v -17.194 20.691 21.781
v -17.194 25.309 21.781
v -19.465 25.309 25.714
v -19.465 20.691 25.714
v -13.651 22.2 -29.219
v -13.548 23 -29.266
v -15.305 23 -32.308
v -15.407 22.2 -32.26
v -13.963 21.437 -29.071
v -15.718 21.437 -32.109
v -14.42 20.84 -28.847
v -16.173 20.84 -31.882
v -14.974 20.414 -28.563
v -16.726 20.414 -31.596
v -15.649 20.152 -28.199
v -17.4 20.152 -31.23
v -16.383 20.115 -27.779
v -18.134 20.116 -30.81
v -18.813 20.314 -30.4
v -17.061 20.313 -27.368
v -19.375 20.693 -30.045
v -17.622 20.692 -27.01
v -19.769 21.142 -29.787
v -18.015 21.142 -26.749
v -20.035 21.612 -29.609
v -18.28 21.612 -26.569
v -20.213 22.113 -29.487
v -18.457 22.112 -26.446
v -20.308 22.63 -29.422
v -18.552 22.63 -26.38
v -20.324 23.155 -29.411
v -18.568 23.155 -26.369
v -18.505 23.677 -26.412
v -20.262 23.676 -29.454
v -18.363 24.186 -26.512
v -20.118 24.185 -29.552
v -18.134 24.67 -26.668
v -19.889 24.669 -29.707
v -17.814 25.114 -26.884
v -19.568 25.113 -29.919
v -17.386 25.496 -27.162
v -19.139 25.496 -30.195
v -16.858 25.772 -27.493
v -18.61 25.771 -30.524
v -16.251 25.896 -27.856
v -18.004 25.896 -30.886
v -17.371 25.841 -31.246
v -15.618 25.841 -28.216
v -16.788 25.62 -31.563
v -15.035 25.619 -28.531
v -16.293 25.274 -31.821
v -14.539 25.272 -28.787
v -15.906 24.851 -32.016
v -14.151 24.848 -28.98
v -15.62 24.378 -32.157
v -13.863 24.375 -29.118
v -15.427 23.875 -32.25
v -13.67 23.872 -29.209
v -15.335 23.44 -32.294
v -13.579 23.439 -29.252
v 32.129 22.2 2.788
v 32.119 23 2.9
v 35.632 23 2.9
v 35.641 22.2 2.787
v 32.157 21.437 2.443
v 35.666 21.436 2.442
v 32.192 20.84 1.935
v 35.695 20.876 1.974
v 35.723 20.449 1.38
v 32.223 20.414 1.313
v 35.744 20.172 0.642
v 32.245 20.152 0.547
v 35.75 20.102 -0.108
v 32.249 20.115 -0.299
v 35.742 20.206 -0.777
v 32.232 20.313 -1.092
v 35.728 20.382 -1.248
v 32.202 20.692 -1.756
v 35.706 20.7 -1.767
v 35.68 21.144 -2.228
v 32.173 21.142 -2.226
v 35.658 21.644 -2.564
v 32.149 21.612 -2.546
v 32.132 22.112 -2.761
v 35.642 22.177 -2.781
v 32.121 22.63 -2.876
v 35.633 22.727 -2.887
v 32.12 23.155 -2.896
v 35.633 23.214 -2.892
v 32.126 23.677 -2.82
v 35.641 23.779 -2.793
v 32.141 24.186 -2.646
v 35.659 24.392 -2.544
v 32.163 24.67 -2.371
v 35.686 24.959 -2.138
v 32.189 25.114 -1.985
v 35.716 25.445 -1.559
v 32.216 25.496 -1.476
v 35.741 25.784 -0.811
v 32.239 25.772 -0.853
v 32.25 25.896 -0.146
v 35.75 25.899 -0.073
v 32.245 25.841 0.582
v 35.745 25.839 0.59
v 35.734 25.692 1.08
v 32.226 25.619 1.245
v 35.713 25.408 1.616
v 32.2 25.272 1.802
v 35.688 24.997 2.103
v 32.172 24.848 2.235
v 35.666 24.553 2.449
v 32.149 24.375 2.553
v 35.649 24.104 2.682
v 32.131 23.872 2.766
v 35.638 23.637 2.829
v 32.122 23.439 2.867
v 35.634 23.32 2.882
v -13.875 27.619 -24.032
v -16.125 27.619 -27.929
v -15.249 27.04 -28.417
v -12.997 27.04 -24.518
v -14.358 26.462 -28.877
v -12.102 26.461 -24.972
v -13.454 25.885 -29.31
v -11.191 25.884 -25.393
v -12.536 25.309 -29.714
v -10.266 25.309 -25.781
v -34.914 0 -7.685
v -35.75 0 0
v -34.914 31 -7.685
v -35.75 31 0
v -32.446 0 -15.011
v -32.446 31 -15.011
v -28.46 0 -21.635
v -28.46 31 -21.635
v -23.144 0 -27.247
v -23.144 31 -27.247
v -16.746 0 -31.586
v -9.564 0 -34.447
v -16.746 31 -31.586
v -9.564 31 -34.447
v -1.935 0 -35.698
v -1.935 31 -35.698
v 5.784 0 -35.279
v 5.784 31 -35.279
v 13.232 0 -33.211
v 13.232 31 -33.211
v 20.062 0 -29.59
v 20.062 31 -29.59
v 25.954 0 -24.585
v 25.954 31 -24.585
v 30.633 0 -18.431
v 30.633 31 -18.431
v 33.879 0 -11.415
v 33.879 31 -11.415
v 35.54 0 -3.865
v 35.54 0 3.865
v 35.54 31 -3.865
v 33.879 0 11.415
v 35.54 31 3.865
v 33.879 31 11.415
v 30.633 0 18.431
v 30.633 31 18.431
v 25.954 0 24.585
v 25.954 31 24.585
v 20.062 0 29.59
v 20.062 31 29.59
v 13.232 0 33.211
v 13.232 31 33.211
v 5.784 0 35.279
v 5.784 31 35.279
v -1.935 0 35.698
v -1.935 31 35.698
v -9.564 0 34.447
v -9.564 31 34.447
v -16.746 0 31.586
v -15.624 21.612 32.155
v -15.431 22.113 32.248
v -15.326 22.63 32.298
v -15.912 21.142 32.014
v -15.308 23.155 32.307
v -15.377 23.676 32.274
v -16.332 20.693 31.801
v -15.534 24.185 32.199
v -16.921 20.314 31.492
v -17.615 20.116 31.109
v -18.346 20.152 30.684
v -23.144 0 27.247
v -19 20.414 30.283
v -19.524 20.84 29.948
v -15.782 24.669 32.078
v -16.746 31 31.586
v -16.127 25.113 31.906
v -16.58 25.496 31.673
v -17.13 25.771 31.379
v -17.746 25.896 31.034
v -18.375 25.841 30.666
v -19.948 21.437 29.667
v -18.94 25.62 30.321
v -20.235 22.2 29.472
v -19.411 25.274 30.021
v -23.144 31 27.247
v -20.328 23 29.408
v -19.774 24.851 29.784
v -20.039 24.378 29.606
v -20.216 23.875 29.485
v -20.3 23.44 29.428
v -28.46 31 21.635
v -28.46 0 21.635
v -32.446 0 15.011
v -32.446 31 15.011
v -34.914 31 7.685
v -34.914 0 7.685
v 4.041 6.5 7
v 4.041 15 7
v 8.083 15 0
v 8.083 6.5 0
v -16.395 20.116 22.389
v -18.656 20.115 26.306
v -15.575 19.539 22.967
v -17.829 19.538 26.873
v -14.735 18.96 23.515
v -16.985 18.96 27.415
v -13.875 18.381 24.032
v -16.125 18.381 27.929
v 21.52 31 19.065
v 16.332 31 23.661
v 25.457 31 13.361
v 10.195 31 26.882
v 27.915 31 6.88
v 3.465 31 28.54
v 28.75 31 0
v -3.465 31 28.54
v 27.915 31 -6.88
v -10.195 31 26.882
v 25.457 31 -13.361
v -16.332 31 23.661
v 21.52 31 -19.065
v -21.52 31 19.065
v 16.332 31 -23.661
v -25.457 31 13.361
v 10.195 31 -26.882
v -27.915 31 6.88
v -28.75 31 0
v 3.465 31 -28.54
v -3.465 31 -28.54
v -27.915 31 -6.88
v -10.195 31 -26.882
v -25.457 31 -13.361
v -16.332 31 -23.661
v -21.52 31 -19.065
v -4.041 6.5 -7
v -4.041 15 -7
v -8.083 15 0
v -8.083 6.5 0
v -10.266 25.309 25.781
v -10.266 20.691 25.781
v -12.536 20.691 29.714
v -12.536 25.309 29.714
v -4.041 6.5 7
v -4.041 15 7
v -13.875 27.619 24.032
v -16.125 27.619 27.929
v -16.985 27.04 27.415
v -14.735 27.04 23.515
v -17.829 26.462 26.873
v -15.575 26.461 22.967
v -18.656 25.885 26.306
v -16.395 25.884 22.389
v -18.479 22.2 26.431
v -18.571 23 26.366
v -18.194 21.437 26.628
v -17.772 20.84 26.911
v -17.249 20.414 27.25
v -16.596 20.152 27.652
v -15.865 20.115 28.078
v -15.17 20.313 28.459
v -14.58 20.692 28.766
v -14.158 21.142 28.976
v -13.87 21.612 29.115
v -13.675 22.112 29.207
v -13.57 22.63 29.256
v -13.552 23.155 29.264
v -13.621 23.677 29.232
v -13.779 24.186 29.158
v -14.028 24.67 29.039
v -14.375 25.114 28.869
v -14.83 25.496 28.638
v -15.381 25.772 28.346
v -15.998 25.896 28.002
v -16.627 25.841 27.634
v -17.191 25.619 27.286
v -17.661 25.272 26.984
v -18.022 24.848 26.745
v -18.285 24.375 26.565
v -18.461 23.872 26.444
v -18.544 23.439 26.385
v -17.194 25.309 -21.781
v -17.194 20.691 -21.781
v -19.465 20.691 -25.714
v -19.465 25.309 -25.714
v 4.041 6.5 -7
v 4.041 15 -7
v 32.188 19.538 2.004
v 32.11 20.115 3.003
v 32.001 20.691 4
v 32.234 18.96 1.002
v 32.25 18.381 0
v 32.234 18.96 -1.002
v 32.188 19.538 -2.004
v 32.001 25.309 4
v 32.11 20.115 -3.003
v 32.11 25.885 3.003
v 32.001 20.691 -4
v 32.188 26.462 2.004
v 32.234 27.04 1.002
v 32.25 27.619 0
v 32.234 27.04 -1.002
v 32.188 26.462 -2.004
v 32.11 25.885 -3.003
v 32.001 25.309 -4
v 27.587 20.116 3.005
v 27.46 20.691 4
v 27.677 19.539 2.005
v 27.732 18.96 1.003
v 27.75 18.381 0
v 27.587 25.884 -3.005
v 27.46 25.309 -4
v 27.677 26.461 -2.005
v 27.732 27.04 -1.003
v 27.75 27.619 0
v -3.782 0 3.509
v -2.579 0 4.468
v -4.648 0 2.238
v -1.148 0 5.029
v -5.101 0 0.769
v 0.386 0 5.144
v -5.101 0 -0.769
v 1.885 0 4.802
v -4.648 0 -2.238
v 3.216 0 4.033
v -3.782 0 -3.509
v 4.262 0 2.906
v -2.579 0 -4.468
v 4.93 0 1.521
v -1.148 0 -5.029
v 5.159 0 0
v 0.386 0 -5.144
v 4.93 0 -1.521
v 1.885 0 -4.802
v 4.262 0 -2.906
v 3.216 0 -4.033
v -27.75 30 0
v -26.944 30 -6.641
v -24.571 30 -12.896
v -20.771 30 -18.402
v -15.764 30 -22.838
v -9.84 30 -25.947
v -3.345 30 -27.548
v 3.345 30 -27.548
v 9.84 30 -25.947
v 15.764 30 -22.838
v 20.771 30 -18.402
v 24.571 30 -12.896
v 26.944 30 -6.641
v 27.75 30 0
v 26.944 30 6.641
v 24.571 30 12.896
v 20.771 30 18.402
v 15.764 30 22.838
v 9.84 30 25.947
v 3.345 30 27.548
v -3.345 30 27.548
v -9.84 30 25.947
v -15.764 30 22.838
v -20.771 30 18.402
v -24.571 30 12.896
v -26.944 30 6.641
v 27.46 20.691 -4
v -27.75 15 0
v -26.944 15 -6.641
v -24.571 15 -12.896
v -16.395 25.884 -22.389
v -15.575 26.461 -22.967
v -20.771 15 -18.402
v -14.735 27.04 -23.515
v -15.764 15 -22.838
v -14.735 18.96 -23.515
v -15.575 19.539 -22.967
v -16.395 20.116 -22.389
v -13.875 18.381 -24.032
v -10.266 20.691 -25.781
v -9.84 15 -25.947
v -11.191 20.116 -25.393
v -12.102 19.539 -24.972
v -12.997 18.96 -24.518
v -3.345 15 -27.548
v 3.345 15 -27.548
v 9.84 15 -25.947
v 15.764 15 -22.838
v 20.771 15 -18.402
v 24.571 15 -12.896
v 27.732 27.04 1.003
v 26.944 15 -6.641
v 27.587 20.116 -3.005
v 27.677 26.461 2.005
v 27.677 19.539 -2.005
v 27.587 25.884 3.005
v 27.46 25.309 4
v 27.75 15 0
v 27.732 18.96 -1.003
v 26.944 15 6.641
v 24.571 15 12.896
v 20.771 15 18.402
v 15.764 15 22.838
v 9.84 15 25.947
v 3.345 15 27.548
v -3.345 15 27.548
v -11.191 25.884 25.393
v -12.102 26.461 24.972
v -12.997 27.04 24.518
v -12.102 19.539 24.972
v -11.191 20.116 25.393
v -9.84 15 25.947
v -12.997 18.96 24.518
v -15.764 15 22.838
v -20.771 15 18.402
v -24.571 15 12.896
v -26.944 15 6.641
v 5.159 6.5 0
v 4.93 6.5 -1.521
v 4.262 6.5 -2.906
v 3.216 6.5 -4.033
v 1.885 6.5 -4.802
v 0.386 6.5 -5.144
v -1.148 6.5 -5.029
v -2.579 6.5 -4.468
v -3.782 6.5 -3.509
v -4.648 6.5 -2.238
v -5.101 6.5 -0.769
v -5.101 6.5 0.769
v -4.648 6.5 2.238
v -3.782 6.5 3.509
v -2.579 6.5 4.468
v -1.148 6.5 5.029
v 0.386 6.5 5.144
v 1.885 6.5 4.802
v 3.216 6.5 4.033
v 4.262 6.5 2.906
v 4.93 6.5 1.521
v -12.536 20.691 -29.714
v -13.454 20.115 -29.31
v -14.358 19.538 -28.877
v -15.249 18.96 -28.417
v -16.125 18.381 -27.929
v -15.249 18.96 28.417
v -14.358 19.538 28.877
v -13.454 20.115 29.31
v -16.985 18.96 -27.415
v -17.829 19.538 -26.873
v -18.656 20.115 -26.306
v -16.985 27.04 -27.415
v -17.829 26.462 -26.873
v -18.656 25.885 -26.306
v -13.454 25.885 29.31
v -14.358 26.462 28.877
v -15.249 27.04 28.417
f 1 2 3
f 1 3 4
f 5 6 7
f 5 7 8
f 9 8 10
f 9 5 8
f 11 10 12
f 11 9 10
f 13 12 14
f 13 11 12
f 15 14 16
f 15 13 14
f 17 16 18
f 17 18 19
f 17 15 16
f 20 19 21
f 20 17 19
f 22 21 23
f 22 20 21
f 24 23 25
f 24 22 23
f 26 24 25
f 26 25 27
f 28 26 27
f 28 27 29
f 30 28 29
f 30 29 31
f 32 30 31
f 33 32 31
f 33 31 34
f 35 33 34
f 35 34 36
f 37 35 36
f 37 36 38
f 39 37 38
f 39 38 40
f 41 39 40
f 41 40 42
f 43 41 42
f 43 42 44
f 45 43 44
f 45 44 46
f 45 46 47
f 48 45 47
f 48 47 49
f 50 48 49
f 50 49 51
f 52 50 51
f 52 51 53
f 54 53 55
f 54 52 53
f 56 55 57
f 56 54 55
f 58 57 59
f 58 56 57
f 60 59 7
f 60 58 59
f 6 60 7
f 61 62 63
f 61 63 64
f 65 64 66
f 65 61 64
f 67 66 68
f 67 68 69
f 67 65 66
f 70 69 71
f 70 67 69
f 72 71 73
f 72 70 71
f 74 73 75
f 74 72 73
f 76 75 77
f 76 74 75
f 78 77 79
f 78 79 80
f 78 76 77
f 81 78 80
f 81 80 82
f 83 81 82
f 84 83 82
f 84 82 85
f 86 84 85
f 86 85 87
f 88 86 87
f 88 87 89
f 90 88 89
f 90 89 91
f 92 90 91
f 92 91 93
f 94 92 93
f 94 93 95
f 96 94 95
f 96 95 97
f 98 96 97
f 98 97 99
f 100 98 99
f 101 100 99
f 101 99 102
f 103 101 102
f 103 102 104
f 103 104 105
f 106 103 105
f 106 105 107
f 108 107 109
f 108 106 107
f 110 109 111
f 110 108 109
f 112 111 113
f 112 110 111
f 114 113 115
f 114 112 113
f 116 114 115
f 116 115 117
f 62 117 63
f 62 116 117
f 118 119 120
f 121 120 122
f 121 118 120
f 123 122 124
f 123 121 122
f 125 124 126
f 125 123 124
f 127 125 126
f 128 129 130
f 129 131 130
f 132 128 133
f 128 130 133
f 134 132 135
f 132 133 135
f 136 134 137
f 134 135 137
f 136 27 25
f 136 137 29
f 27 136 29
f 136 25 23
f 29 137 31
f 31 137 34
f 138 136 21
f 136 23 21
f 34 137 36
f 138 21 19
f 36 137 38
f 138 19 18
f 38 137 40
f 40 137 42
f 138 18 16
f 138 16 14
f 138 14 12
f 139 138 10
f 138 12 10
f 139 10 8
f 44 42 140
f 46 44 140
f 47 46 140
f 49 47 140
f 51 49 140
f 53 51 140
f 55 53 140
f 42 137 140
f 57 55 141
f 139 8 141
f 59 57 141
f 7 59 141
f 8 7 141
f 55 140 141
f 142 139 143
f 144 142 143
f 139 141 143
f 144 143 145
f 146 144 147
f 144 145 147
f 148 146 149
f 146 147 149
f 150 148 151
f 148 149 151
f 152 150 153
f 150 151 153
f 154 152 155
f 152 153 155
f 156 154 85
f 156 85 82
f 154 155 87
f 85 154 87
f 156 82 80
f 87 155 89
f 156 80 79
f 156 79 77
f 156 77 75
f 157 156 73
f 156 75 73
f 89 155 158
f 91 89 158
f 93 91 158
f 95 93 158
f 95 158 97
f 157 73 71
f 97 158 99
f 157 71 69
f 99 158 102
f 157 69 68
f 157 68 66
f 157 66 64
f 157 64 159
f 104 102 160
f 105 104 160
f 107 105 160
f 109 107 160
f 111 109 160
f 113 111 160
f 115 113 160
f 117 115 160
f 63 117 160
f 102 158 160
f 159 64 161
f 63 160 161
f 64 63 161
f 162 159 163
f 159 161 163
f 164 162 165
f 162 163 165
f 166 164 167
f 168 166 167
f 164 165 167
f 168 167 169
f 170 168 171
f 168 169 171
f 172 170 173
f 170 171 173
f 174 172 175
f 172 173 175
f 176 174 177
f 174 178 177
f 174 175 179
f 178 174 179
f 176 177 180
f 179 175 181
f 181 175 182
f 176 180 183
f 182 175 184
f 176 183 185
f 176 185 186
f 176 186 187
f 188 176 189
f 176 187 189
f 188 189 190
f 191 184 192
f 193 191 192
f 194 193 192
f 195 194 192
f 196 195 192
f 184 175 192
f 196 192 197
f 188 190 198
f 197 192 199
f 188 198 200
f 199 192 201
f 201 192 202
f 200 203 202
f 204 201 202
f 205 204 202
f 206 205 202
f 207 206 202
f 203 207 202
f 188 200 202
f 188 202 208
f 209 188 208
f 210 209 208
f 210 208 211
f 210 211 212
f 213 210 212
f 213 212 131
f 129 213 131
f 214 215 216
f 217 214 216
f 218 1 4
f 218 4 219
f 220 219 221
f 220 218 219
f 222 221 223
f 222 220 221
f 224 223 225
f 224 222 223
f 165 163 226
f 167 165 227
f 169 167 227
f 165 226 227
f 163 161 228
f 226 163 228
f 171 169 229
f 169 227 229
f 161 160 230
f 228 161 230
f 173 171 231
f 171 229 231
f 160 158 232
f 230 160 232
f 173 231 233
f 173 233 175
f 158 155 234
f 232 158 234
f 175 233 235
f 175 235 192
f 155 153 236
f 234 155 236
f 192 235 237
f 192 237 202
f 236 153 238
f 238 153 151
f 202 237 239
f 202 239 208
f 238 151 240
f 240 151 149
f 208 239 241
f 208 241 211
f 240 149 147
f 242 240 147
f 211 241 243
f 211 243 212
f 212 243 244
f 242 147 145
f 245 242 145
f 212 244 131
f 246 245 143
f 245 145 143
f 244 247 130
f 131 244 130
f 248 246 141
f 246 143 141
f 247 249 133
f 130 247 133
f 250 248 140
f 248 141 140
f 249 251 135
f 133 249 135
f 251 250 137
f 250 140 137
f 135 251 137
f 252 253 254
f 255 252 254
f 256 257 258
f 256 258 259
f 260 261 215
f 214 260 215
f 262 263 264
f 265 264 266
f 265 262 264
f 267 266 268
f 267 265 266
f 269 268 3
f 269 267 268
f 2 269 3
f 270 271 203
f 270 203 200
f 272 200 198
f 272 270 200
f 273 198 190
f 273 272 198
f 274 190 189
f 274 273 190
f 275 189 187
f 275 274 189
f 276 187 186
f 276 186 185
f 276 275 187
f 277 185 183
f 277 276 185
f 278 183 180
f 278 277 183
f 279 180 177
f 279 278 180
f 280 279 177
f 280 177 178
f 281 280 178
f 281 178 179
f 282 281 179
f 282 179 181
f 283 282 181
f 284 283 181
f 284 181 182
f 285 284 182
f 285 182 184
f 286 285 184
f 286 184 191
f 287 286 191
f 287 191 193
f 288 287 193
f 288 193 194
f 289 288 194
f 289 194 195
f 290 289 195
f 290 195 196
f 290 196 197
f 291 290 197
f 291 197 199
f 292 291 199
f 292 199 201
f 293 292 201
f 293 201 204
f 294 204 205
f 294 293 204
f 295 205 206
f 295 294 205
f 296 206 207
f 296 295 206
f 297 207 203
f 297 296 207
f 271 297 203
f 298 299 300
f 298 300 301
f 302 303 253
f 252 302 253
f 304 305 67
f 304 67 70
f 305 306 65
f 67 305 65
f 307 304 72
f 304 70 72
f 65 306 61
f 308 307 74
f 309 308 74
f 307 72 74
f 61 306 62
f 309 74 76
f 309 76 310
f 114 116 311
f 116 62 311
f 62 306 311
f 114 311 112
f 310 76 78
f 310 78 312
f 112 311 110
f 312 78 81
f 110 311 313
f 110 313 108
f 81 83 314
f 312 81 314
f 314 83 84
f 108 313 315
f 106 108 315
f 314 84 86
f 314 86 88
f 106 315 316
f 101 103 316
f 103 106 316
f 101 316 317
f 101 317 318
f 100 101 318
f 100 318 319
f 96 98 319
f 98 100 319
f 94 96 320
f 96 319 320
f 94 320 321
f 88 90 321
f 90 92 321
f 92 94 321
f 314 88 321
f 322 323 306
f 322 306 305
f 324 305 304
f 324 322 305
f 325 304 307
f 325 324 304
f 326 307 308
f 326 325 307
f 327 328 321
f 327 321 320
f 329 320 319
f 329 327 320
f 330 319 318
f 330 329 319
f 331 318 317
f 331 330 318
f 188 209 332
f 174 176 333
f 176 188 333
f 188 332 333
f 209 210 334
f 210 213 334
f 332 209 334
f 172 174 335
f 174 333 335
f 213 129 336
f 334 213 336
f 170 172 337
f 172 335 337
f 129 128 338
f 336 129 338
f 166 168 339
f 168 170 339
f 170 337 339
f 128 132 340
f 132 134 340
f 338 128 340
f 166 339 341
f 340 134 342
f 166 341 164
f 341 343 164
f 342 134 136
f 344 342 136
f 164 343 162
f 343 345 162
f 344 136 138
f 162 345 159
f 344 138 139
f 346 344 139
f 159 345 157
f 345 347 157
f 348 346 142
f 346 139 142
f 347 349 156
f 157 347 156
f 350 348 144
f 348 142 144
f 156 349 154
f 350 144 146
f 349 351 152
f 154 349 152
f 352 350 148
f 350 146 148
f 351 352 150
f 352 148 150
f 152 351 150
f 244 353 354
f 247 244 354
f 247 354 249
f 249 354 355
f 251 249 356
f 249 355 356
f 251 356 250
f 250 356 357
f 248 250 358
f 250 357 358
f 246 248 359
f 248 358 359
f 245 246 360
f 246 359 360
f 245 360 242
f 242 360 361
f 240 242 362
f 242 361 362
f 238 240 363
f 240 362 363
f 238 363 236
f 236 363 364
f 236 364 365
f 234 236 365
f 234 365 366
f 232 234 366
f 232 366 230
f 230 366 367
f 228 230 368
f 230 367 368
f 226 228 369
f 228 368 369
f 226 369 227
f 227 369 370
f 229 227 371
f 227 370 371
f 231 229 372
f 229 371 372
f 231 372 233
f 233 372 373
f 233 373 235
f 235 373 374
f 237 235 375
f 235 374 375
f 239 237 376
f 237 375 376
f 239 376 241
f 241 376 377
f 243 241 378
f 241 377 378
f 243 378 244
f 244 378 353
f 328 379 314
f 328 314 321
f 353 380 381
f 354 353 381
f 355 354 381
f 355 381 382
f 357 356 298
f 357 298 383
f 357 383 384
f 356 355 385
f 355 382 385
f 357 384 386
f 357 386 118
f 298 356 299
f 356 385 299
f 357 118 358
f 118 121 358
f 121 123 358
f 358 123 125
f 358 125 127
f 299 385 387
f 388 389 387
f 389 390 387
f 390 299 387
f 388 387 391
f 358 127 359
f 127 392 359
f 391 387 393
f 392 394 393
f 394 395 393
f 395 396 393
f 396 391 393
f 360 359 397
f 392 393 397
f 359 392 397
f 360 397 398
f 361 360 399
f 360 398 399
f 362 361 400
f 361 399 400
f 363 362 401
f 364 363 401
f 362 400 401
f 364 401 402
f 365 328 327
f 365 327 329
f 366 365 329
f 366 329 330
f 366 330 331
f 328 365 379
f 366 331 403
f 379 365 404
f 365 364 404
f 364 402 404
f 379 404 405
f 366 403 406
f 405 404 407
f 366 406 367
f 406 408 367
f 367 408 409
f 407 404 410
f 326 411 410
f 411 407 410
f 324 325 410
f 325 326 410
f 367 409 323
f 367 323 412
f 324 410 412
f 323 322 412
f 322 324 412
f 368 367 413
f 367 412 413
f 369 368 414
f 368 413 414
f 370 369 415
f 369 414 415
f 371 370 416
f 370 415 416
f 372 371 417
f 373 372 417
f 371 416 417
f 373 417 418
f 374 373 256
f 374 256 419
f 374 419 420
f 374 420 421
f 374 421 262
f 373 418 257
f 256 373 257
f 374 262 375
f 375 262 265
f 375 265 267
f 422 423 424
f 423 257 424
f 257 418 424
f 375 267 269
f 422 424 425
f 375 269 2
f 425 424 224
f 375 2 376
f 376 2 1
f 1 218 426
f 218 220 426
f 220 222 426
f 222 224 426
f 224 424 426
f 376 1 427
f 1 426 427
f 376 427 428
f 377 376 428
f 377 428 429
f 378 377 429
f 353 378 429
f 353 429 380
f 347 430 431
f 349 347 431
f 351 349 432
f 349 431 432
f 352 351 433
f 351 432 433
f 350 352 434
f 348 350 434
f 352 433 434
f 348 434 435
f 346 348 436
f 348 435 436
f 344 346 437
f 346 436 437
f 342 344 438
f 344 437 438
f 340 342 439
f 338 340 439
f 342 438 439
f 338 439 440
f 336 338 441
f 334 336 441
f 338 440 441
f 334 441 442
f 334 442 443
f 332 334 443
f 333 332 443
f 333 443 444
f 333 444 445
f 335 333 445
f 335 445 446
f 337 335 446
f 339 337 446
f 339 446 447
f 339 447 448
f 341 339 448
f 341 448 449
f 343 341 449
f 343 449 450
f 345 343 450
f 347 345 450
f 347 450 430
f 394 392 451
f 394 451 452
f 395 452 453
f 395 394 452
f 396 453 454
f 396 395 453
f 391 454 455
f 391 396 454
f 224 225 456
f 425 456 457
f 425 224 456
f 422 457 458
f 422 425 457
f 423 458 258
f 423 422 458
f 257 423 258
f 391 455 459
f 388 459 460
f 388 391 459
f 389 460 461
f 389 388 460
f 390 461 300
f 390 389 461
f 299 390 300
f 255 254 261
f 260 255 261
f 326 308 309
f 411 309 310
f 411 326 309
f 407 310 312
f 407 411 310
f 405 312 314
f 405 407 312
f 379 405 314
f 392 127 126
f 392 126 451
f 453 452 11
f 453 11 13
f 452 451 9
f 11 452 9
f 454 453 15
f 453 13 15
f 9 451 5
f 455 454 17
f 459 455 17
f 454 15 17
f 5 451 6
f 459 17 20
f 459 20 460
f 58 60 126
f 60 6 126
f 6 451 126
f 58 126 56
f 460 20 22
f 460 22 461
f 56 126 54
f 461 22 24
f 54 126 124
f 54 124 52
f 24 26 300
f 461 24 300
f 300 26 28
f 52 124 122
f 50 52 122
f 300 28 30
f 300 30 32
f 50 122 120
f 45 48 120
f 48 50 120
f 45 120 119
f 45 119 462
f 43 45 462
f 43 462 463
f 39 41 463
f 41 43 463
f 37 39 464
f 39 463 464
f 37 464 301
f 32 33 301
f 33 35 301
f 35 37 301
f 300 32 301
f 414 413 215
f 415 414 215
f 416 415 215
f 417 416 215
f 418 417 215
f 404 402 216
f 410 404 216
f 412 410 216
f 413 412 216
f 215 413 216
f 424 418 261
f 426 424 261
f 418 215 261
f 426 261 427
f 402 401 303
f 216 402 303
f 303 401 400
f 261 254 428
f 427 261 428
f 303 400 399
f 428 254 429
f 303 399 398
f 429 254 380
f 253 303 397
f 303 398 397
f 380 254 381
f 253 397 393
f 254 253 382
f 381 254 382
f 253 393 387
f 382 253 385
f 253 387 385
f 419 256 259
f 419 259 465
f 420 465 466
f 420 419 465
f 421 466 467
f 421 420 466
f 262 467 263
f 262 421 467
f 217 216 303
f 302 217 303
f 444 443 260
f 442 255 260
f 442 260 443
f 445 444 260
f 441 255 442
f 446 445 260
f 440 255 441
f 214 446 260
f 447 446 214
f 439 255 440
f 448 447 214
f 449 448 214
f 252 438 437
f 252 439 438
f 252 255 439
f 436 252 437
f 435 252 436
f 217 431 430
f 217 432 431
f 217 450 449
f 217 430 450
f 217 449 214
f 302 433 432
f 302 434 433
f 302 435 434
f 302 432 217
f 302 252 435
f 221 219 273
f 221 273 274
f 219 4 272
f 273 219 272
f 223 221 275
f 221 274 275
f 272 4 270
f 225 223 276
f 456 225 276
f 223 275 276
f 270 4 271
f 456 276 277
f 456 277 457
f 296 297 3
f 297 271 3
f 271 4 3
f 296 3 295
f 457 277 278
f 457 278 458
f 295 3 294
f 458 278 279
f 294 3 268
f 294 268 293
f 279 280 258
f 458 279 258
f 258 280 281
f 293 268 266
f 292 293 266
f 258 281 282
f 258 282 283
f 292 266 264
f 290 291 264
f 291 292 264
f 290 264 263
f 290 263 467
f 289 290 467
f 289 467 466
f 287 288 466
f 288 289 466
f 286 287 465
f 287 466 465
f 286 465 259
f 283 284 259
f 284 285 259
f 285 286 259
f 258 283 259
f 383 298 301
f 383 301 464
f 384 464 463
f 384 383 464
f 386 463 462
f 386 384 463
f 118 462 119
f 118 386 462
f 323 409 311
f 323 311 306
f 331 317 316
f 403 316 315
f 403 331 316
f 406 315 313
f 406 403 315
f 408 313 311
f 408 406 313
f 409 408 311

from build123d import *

# Parameters (mm, degrees)
CUT_EXTRUDE_1_REACH      = 61.305
CUT_EXTRUDE_1_END_RADIUS = 32.25
SKETCH_3_R               = 2.9
CUT_EXTRUDE_2_DEPTH      = 60.30535389
PATTERN_CIRCULAR_1_COUNT = 3
CUT_EXTRUDE_5_DEPTH      = 8.5
HOLE_WIZARD_3_8_1_D      = 10.31748
HOLE_WIZARD_3_8_1_DEPTH  = 10
HOLE_WIZARD_3_8_1_TIP    = 3.09968371
CHAMFER_1_SIZE           = 1


with BuildPart() as part:
    # 草圖1 → 旋轉1 (revolve)
    with BuildSketch(Plane.XY, mode=Mode.PRIVATE) as revolve_1_sk:
        Polygon((0, 15), (0, 0), (35.75, 0), (35.75, 31), (27.75, 31), (27.75, 15), align=None)
    revolve(revolve_1_sk.sketch.rotate(Axis((0, 38.135683761, 0), (0, -1, 0)), 180), axis=Axis((0, 38.135683761, 0), (0, -1, 0)))

    # 除料-伸長1: up to this cylinder (the profile starts inside it)
    cut_extrude_1_end = Plane(origin=(0, 23, 0), z_dir=(0, 1, 0)) * Cylinder(CUT_EXTRUDE_1_END_RADIUS, 188.11, mode=Mode.PRIVATE)
    # 草圖2 → 除料-伸長1 (cut, up to the surface)
    with BuildSketch(Plane(origin=(0, 0, 0), x_dir=(0, 0, -1), z_dir=(1, 0, 0)), mode=Mode.PRIVATE) as cut_extrude_1_sk1:
        Polygon((0, 27.618802154), (-4, 25.309401077), (-4, 20.690598923), (0, 18.381197846), (4, 20.690598923), (4, 25.309401077), align=None)
    cut_extrude_1_tool1 = extrude(cut_extrude_1_sk1.sketch, amount=CUT_EXTRUDE_1_REACH, mode=Mode.PRIVATE) & cut_extrude_1_end
    cut_extrude_1 = cut_extrude_1_tool1.solids().sort_by_distance((0, 23, 0))[0]
    add(cut_extrude_1, mode=Mode.SUBTRACT)

    # 草圖3 → 除料-伸長2 (cut, through all)
    with BuildSketch(Plane(origin=(0, 0, 0), x_dir=(0, 0, -1), z_dir=(1, 0, 0))):
        with Locations(Location((0, 23, 0), (0, 0, 180))):
            Circle(SKETCH_3_R)
    cut_extrude_2 = extrude(amount=CUT_EXTRUDE_2_DEPTH, mode=Mode.SUBTRACT)

    # 環狀複製排列1: 除料-伸長1, 除料-伸長2 ×3 about axis
    pattern_circular_1_axis = Axis((0, 0, 0), (0, 1, 0))
    add([cut_extrude_1.rotate(pattern_circular_1_axis, i * 360 / PATTERN_CIRCULAR_1_COUNT) for i in range(1, PATTERN_CIRCULAR_1_COUNT)], mode=Mode.SUBTRACT)
    add([cut_extrude_2.rotate(pattern_circular_1_axis, i * 360 / PATTERN_CIRCULAR_1_COUNT) for i in range(1, PATTERN_CIRCULAR_1_COUNT)], mode=Mode.SUBTRACT)

    # 草圖6 → 除料-伸長5 (cut)
    with BuildSketch(Plane(origin=(0, 15, 0), x_dir=(1, 0, 0), z_dir=(0, 1, 0))):
        Polygon((8.082903769, 0), (4.041451884, 7), (-4.041451884, 7), (-8.082903769, 0), (-4.041451884, -7), (4.041451884, -7), align=None)
    extrude(amount=-CUT_EXTRUDE_5_DEPTH, mode=Mode.SUBTRACT)

    # 3/8 餘隙孔1
    with Locations(Plane(origin=(0, 0, 0), x_dir=(-1, 0, 0), z_dir=(0, -1, 0))):
        with Locations((0, 0)):
            Hole(HOLE_WIZARD_3_8_1_D / 2, depth=HOLE_WIZARD_3_8_1_DEPTH)
            with Locations((0, 0, -(HOLE_WIZARD_3_8_1_DEPTH + HOLE_WIZARD_3_8_1_TIP / 2))):  # 118° drill point
                Cone(0, HOLE_WIZARD_3_8_1_D / 2, HOLE_WIZARD_3_8_1_TIP, mode=Mode.SUBTRACT)

    # 導角1
    chamfer_1_edges = [part.edges().sort_by_distance(p)[0] for p in [
        (27.75, 31, 0),
    ]]
    chamfer(chamfer_1_edges, length=CHAMFER_1_SIZE)


solid = part.part
